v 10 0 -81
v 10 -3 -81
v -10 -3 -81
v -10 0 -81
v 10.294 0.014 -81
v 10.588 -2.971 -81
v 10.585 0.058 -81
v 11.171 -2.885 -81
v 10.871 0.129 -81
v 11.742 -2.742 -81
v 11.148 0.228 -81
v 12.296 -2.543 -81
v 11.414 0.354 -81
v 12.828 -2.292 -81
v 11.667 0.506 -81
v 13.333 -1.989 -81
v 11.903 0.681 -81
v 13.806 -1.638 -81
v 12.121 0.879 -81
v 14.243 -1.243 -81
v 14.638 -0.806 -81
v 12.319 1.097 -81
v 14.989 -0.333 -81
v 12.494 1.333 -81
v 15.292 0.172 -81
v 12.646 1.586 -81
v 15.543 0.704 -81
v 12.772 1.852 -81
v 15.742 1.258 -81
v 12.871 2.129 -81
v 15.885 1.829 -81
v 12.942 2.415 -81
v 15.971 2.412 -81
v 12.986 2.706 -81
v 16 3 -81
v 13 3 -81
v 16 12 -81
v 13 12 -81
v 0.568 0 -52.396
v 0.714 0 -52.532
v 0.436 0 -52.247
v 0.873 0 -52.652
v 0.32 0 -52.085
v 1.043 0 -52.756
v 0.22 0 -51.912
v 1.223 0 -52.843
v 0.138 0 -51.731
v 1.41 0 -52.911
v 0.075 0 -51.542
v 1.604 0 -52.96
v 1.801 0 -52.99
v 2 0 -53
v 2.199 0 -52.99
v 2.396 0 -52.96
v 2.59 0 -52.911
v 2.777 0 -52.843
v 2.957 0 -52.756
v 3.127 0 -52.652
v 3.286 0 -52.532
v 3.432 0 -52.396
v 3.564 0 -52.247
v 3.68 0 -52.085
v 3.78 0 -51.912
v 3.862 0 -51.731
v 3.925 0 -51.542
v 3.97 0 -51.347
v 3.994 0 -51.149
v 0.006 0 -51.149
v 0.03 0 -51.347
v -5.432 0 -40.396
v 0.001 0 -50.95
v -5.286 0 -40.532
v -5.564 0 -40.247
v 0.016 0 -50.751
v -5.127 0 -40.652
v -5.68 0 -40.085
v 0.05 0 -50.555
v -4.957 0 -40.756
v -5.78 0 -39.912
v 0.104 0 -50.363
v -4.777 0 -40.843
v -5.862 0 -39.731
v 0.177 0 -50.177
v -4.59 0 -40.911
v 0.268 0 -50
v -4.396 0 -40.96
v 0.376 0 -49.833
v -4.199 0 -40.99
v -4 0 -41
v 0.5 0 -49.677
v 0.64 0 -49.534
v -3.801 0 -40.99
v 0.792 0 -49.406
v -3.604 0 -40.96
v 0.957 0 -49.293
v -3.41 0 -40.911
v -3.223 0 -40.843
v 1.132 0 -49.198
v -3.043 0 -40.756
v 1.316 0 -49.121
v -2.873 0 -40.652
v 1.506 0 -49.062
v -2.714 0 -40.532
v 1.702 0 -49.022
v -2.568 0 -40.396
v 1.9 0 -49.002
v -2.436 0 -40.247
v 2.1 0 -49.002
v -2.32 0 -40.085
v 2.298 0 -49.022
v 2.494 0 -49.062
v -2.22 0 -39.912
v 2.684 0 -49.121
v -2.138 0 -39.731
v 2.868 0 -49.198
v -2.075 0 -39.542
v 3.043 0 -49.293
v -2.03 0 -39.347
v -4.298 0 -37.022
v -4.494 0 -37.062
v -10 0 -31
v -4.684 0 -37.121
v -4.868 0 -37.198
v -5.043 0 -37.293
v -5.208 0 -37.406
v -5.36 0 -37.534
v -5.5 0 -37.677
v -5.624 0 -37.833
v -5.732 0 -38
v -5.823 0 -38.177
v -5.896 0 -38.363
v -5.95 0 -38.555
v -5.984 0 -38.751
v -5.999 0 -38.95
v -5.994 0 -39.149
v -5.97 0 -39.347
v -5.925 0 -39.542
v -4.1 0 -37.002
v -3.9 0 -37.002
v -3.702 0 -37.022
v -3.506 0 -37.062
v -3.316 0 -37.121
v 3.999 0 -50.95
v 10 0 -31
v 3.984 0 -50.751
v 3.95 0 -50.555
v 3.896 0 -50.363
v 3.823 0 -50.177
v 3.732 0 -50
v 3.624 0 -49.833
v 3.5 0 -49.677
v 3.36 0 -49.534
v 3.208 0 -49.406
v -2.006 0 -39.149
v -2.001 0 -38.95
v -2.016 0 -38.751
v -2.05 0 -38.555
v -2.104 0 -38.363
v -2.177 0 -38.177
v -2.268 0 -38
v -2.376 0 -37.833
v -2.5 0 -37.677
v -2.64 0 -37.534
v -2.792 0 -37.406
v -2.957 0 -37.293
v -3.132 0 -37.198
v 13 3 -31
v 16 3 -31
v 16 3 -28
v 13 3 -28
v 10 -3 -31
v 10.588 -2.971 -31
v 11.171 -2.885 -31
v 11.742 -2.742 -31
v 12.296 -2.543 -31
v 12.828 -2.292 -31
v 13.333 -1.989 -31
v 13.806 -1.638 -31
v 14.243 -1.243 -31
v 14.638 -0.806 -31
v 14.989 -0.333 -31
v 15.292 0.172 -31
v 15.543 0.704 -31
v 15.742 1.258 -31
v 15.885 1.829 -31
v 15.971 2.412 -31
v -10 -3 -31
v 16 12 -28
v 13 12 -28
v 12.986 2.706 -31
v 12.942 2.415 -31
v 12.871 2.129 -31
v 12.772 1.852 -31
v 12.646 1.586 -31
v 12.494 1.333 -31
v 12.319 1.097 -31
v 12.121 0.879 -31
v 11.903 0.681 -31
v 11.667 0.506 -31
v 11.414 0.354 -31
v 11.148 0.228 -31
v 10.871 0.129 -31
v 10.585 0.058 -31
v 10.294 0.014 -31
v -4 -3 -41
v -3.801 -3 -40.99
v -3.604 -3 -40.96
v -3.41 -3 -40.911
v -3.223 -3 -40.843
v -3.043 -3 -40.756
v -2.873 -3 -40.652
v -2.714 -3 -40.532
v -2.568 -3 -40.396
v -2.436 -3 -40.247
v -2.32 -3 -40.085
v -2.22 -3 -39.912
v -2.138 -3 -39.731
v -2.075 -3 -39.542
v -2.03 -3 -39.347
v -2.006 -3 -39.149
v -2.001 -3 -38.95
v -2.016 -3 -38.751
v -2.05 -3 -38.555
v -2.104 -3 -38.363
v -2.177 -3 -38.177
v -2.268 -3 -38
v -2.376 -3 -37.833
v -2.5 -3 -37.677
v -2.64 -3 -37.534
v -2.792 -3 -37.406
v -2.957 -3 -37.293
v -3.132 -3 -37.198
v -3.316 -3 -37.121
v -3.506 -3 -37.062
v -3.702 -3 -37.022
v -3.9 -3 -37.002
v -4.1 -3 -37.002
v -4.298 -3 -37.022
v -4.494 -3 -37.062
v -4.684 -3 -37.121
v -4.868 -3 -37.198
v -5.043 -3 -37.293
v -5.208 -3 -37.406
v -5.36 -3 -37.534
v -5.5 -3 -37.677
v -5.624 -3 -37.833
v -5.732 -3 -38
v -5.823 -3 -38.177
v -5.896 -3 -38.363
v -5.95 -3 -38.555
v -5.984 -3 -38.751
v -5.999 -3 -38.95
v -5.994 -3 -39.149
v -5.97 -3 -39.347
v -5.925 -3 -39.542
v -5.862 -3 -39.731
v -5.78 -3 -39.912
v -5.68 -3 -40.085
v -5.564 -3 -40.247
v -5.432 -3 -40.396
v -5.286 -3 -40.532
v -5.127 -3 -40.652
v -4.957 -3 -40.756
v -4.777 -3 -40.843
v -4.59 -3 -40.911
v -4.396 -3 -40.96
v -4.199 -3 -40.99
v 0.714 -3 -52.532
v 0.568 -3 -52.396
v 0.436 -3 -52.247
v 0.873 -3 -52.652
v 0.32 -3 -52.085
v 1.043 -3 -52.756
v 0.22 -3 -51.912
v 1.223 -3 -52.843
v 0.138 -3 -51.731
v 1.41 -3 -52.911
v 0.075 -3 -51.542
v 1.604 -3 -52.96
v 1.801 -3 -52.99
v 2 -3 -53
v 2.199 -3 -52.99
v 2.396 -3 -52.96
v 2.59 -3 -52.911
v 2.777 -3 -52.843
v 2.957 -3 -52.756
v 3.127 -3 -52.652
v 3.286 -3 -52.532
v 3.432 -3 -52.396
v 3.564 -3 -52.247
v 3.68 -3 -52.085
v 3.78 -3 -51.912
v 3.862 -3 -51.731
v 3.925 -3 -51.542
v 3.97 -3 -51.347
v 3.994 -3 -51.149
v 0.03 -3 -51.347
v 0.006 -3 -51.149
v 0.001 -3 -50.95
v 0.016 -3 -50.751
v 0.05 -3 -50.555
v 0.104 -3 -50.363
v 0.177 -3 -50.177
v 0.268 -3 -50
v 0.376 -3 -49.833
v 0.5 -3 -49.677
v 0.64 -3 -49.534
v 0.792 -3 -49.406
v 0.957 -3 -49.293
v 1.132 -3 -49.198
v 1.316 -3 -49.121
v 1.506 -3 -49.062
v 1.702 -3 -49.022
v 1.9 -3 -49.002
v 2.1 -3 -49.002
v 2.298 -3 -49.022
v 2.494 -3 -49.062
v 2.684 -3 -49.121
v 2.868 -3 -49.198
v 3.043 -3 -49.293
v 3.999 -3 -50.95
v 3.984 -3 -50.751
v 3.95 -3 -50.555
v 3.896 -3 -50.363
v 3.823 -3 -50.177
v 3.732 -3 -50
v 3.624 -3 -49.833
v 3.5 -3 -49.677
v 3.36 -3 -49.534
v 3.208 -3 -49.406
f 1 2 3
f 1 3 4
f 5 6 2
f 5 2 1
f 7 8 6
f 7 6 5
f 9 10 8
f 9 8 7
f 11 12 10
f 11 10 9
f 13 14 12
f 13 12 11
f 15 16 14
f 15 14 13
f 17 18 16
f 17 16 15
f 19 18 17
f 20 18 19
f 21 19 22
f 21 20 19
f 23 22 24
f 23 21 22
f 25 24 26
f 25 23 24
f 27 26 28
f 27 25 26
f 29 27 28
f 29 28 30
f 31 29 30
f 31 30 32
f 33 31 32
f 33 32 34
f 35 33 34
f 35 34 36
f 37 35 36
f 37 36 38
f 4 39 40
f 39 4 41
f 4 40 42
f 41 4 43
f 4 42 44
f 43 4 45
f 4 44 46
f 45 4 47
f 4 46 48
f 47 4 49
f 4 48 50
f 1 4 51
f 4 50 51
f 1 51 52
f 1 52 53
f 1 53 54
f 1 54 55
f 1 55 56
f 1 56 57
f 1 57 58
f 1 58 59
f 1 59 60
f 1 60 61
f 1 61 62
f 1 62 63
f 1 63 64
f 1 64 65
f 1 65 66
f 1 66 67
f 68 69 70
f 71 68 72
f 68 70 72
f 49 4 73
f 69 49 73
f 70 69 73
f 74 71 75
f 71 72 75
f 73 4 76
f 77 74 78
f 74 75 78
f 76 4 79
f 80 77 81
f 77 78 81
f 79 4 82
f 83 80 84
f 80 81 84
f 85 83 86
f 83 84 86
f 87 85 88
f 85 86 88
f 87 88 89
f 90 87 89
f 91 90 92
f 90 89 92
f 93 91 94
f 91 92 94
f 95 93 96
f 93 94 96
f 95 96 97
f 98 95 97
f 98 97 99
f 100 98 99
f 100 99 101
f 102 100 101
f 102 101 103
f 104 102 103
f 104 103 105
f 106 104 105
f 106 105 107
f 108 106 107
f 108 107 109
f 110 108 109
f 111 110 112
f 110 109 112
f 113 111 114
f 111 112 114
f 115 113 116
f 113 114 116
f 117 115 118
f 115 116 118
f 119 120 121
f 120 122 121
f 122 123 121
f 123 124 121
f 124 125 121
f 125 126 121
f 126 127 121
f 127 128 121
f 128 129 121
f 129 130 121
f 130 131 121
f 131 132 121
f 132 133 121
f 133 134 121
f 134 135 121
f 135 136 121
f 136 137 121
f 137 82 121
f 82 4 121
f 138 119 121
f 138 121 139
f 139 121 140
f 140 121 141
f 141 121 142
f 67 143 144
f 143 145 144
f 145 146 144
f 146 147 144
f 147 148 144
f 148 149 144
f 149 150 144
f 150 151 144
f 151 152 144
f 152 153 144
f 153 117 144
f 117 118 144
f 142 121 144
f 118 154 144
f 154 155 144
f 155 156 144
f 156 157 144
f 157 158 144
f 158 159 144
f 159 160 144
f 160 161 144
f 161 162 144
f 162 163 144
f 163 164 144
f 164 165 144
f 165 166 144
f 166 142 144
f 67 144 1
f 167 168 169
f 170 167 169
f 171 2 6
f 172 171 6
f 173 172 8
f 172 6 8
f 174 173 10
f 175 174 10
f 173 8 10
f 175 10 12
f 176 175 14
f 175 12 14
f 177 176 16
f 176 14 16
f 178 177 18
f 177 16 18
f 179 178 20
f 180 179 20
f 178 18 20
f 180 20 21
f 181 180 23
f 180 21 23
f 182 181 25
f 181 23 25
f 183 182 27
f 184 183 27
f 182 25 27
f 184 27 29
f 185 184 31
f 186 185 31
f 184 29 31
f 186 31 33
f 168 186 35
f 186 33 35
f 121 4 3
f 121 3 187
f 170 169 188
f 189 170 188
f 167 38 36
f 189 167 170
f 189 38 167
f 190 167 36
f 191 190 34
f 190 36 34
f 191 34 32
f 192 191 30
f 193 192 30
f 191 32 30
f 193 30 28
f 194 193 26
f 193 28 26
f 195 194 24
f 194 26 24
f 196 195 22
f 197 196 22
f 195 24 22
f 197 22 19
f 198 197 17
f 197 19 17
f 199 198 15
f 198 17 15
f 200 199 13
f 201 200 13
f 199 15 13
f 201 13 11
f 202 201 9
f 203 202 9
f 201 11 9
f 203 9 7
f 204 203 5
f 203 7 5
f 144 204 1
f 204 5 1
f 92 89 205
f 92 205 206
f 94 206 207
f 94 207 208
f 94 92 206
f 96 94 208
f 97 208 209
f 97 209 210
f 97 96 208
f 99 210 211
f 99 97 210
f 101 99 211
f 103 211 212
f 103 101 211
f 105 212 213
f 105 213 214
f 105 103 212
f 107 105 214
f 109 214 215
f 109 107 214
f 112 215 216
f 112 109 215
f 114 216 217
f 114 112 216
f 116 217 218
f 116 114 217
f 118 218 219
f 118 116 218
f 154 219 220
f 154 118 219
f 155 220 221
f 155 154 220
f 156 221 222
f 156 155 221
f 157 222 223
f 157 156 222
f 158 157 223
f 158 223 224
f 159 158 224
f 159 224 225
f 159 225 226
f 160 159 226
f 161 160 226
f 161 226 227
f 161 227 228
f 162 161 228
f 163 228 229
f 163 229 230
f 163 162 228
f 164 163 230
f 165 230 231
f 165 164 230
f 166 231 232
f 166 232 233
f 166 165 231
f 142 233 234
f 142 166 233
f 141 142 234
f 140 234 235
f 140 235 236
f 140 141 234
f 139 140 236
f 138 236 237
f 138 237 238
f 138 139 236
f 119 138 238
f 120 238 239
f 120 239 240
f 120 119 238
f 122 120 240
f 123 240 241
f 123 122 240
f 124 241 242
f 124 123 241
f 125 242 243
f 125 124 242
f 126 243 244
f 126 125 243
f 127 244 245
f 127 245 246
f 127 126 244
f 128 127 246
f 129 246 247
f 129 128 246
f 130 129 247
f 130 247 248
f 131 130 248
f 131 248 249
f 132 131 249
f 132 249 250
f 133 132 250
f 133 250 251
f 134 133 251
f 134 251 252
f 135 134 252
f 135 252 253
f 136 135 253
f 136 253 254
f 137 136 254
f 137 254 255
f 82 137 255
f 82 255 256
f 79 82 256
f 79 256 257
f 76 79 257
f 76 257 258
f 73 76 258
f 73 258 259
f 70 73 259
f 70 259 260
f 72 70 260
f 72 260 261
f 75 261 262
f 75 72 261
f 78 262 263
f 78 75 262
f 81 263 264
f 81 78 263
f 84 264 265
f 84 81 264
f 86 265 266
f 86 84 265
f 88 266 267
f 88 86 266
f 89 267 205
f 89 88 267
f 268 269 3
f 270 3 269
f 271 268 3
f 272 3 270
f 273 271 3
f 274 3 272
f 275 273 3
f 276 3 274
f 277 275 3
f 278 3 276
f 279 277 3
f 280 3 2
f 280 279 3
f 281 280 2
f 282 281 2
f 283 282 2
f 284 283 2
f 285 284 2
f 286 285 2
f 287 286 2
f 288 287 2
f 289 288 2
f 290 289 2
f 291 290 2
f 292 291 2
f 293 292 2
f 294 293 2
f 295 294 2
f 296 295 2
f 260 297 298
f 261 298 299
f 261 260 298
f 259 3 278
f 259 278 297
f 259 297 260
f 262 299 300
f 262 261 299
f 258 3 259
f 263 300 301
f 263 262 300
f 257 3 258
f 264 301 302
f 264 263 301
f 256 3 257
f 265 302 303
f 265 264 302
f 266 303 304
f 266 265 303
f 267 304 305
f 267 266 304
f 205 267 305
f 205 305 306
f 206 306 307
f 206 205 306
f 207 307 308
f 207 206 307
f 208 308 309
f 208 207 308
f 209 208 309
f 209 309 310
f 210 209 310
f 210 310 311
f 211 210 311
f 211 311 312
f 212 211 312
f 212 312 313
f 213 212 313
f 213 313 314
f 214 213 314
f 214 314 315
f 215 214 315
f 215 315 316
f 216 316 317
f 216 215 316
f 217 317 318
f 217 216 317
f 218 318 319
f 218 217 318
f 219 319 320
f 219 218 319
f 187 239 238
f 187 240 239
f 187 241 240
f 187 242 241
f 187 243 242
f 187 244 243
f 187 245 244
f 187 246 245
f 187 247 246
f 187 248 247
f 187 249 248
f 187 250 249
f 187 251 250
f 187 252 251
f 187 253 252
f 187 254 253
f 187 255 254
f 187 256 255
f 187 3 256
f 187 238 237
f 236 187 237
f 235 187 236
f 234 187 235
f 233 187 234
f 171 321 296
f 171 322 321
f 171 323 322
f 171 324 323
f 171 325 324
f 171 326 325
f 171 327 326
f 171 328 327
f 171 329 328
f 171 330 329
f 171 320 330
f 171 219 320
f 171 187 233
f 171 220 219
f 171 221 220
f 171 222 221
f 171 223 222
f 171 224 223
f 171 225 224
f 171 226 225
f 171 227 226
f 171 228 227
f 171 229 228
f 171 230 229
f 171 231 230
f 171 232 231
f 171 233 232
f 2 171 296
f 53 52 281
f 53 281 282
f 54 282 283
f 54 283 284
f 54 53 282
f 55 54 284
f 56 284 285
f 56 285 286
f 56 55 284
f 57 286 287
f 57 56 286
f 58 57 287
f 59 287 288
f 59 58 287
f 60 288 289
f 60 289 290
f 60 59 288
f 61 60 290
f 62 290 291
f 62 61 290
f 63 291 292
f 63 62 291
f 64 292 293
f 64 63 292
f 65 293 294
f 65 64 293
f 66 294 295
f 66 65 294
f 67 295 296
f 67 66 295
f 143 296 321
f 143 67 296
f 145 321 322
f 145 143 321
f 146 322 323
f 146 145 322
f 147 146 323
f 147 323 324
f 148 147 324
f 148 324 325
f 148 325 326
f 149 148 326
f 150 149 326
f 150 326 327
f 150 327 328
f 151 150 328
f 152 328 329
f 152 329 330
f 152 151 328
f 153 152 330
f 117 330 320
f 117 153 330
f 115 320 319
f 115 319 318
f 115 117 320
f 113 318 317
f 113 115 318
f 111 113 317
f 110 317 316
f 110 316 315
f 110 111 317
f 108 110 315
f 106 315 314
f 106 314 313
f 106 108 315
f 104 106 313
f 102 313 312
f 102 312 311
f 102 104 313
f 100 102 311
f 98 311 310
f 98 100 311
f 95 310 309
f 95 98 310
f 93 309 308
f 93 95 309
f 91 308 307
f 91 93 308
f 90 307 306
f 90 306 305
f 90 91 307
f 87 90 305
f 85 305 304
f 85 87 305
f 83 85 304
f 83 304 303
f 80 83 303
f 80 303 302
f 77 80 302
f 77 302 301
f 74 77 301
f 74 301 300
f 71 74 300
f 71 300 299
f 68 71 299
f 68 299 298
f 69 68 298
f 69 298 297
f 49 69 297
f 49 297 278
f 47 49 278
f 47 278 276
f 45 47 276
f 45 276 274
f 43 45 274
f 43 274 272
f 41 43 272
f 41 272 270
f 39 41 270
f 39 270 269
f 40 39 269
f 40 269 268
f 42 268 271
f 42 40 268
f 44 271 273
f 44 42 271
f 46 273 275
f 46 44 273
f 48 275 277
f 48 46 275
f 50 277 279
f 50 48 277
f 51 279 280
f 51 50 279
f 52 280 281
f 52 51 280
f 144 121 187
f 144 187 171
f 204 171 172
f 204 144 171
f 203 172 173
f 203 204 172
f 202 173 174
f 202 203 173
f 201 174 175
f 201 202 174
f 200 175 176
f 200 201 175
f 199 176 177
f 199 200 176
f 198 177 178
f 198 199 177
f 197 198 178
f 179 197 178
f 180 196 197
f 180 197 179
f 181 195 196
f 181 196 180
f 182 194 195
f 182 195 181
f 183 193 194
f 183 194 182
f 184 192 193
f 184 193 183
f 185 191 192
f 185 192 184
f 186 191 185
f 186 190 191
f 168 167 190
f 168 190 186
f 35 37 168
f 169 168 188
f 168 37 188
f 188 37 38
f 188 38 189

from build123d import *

# Parameters (mm, degrees)
SKETCH1_W               = 20
SKETCH1_H               = 50
SKETCH1_R               = 2
BASE_FLANGE1_DEPTH      = 3
EDGE_FLANGE1_DEPTH      = 50
EDGE_FLANGE1_START      = 3
EDGE_FLANGE1_PROFILE_W  = 53
EDGE_FLANGE1_PROFILE_H  = 9
EDGE_FLANGE1_FLAT_DEPTH = 3


# Sheet-metal steps are written as plain solids
with BuildPart() as part:
    # Sketch1 → Base-Flange1 (new body)
    with BuildSketch(Plane(origin=(0, 0, 0), x_dir=(1, 0, 0), z_dir=(0, 1, 0))):
        Rectangle(SKETCH1_W, SKETCH1_H)
        with Locations(Location((-4, 17, 0), (0, 0, 270))):
            Circle(SKETCH1_R, mode=Mode.SUBTRACT)
        with Locations(Location((2, 5, 0), (0, 0, 270))):
            Circle(SKETCH1_R, mode=Mode.SUBTRACT)
    extrude(amount=-BASE_FLANGE1_DEPTH)

    # Edge-Flange1 bend section (across the edge) → Edge-Flange1 (add)
    with BuildSketch(Plane(origin=(13, 0, 25), x_dir=(-1, 0, 0), z_dir=(0, 0, -1))):
        with BuildLine():
            Line((-3, 3), (0, 3))
            ThreePointArc((0, 3), (0.878679656, 0.878679656), (3, 0))
            Line((3, 0), (3, -3))
            ThreePointArc((3, -3), (-1.242640687, -1.242640687), (-3, 3))
        make_face()
    extrude(amount=EDGE_FLANGE1_DEPTH)

    # Edge-Flange1 profile (on flange) → Edge-Flange1 flat (add)
    with BuildSketch(Plane(origin=(13, 0, 0), x_dir=(0, 0, -1), z_dir=(1, 0, 0)).offset(EDGE_FLANGE1_START)):
        with Locations((1.5, 7.5)):
            Rectangle(EDGE_FLANGE1_PROFILE_W, EDGE_FLANGE1_PROFILE_H)
    extrude(amount=-EDGE_FLANGE1_FLAT_DEPTH)


with BuildPart() as body_2:
    # Mirror1: mirrored copy
    add(part.part.mirror(Plane(origin=(14.5, 7.5, -28), x_dir=(1, 0, 0), z_dir=(0, 0, -1))))


solid = body_2.part
